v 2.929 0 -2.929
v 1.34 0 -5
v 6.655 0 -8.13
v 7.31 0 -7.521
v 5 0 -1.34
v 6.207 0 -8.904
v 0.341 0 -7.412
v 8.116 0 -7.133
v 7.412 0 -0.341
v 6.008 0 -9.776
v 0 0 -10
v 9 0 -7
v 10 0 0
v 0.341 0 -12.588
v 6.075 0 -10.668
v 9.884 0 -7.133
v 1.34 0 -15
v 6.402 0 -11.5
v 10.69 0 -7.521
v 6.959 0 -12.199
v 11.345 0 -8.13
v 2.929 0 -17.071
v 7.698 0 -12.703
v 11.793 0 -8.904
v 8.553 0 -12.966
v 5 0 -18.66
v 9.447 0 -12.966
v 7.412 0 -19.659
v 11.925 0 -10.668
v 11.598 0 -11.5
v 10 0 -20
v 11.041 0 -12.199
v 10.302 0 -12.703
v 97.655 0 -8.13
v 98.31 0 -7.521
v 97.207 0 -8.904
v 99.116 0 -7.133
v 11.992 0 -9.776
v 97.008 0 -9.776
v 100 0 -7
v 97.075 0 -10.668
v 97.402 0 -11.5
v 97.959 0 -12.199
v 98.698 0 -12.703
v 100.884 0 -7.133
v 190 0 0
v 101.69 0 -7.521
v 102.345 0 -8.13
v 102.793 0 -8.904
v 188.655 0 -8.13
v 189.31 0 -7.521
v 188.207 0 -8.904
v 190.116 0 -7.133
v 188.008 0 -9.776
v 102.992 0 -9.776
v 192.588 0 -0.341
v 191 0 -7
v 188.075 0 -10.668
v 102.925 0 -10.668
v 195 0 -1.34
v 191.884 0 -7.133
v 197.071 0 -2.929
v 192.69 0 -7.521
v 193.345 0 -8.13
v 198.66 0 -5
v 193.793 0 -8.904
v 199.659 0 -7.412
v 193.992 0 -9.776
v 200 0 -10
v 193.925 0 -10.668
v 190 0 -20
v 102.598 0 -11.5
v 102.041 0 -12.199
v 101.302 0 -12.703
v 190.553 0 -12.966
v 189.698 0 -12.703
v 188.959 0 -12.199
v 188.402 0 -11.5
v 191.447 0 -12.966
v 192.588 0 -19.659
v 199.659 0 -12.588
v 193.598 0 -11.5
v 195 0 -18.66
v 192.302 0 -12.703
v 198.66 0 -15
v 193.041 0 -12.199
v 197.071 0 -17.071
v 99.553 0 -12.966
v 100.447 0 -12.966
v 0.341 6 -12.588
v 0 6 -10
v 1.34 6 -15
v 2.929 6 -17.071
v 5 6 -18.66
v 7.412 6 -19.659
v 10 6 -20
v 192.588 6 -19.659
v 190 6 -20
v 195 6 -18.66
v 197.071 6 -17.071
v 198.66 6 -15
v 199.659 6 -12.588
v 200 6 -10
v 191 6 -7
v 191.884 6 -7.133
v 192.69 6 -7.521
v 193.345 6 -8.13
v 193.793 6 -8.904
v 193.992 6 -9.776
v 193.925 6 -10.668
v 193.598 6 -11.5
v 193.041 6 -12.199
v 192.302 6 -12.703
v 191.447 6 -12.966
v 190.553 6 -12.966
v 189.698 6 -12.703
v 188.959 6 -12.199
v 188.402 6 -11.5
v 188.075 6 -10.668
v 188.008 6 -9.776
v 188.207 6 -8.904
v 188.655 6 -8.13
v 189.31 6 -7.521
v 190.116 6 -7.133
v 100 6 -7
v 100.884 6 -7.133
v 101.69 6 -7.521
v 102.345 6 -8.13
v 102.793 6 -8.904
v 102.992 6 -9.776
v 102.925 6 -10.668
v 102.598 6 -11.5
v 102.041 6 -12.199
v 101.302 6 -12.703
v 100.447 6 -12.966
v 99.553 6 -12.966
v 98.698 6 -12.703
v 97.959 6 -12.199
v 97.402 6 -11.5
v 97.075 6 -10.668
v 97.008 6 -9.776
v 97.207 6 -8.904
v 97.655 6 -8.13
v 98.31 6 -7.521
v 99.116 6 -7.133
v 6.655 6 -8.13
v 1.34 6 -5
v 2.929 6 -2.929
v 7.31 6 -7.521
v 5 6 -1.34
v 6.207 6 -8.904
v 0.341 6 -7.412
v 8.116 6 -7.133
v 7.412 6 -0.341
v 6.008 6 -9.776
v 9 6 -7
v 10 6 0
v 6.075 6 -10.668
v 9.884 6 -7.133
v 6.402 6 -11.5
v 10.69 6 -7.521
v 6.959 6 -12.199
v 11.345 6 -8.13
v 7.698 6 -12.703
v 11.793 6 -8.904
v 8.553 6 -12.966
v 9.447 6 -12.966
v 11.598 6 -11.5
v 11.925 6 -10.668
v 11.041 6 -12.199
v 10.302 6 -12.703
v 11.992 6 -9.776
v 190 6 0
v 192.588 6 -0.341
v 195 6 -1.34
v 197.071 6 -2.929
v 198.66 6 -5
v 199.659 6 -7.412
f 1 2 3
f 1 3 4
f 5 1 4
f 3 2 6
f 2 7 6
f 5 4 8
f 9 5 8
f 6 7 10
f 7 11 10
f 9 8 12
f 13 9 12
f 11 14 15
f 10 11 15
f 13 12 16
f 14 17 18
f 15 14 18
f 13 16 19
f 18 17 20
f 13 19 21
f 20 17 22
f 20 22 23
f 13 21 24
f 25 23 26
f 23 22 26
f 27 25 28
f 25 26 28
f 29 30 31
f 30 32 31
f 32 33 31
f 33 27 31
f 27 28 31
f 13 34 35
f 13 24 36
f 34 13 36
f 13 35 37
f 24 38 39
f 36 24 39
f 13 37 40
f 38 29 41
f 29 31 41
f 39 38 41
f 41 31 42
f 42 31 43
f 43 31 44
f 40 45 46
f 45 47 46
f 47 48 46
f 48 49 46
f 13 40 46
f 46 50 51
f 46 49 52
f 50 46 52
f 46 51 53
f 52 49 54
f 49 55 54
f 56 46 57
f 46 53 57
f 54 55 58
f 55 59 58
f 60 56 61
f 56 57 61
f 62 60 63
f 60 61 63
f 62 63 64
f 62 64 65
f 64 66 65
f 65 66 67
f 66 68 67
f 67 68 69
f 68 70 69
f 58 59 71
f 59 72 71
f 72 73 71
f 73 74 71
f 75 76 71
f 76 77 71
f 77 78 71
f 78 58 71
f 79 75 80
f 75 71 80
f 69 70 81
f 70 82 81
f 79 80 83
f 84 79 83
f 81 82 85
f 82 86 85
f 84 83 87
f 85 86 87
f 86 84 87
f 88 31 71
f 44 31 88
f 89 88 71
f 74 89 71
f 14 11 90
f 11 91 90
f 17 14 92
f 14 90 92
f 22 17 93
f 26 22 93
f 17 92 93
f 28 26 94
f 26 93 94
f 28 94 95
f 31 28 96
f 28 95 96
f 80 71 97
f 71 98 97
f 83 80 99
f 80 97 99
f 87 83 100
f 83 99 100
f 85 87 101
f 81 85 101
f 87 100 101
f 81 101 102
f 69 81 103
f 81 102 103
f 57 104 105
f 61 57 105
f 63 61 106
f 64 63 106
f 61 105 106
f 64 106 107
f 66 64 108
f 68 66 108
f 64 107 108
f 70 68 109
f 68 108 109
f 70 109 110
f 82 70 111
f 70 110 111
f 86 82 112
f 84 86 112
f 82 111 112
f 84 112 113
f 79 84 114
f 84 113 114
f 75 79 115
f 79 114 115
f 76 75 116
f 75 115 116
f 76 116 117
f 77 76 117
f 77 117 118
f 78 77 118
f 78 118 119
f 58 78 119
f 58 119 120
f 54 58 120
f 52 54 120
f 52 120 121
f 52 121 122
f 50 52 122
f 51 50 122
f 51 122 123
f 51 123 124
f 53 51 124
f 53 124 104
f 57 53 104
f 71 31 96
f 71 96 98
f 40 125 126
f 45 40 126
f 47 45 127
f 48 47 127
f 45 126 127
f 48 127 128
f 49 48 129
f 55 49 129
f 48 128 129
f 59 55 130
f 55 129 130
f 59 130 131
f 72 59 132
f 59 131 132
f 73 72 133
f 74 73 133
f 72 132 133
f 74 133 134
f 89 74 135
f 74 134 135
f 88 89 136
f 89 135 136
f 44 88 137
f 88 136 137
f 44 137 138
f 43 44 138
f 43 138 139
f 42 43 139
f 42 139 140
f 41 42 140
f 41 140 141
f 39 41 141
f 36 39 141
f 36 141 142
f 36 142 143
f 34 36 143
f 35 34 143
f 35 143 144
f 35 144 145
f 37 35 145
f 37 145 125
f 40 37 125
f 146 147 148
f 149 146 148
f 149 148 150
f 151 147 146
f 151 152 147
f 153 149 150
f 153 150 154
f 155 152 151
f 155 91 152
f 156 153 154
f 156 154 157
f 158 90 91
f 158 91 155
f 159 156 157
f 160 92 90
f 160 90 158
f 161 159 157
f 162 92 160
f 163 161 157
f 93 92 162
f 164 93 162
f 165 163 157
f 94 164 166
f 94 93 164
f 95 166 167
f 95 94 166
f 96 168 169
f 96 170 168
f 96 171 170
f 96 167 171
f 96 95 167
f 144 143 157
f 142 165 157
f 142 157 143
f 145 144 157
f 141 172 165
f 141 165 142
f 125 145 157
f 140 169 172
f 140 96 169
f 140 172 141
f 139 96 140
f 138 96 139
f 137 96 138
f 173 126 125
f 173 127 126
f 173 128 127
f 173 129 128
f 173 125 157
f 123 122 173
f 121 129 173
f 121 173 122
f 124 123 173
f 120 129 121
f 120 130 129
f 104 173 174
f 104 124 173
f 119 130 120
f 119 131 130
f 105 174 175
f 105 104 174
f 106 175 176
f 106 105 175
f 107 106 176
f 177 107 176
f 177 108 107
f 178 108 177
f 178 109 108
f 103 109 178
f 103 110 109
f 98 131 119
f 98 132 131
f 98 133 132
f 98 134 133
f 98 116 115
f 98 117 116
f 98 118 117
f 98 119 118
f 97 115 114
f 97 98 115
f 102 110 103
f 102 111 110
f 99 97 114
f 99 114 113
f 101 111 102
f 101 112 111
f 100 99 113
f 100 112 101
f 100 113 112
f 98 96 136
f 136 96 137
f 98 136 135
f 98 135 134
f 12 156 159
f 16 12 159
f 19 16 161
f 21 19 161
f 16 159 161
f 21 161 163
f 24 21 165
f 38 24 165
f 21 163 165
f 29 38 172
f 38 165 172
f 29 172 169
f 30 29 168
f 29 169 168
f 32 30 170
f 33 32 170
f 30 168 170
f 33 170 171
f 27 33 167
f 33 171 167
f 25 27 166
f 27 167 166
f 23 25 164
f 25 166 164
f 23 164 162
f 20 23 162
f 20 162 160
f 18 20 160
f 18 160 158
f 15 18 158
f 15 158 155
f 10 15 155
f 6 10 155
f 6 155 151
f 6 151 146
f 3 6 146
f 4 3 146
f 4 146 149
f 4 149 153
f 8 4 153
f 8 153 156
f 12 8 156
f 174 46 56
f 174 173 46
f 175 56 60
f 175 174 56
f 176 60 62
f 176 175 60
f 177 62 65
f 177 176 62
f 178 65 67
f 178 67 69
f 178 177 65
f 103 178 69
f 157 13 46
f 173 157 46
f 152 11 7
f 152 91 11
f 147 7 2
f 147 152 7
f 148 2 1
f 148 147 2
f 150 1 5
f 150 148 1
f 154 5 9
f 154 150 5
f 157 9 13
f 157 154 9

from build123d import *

# Parameters (mm, degrees)
SKETCH2_W           = 200
SKETCH2_H           = 20
BOSS_EXTRUDE1_DEPTH = 6
SKETCH3_R           = 3
CUT_EXTRUDE1_DEPTH  = 202.087045828
SKETCH4_R           = 3
CUT_EXTRUDE2_DEPTH  = 202.087045828
FILLET1_R           = 10
FILLET2_R           = 10
SKETCH6_R           = 3
CUT_EXTRUDE3_DEPTH  = 202.087045828


with BuildPart() as part:
    # Sketch2 → Boss-Extrude1 (new body)
    with BuildSketch(Plane(origin=(0, 0, 0), x_dir=(1, 0, 0), z_dir=(0, 1, 0))):
        with Locations((100, 10)):
            Rectangle(SKETCH2_W, SKETCH2_H)
    extrude(amount=BOSS_EXTRUDE1_DEPTH)

    # Sketch3 → Cut-Extrude1 (cut, through all)
    with BuildSketch(Plane(origin=(0, 6, 0), x_dir=(1, 0, 0), z_dir=(0, 1, 0))):
        with Locations(Location((9, 10, 0), (0, 0, 270))):
            Circle(SKETCH3_R)
    extrude(amount=-CUT_EXTRUDE1_DEPTH, mode=Mode.SUBTRACT)

    # Sketch4 → Cut-Extrude2 (cut, through all)
    with BuildSketch(Plane(origin=(0, 6, 0), x_dir=(1, 0, 0), z_dir=(0, 1, 0))):
        with Locations(Location((191, 10, 0), (0, 0, 270))):
            Circle(SKETCH4_R)
    extrude(amount=-CUT_EXTRUDE2_DEPTH, mode=Mode.SUBTRACT)

    # Fillet1
    fillet1_edges = [part.edges().sort_by_distance(p)[0] for p in [
        (0, 3, -20),
        (0, 3, 0),
    ]]
    fillet(fillet1_edges, radius=FILLET1_R - 0.0001)  # a hair under: the kernel refuses the full size

    # Fillet2
    fillet2_edges = [part.edges().sort_by_distance(p)[0] for p in [
        (200, 3, -20),
        (200, 3, 0),
    ]]
    fillet(fillet2_edges, radius=FILLET2_R - 0.0001)  # a hair under: the kernel refuses the full size

    # Sketch6 → Cut-Extrude3 (cut, through all)
    with BuildSketch(Plane(origin=(0, 6, 0), x_dir=(1, 0, 0), z_dir=(0, 1, 0))):
        with Locations(Location((100, 10, 0), (0, 0, 270))):
            Circle(SKETCH6_R)
    extrude(amount=-CUT_EXTRUDE3_DEPTH, mode=Mode.SUBTRACT)


solid = part.part
